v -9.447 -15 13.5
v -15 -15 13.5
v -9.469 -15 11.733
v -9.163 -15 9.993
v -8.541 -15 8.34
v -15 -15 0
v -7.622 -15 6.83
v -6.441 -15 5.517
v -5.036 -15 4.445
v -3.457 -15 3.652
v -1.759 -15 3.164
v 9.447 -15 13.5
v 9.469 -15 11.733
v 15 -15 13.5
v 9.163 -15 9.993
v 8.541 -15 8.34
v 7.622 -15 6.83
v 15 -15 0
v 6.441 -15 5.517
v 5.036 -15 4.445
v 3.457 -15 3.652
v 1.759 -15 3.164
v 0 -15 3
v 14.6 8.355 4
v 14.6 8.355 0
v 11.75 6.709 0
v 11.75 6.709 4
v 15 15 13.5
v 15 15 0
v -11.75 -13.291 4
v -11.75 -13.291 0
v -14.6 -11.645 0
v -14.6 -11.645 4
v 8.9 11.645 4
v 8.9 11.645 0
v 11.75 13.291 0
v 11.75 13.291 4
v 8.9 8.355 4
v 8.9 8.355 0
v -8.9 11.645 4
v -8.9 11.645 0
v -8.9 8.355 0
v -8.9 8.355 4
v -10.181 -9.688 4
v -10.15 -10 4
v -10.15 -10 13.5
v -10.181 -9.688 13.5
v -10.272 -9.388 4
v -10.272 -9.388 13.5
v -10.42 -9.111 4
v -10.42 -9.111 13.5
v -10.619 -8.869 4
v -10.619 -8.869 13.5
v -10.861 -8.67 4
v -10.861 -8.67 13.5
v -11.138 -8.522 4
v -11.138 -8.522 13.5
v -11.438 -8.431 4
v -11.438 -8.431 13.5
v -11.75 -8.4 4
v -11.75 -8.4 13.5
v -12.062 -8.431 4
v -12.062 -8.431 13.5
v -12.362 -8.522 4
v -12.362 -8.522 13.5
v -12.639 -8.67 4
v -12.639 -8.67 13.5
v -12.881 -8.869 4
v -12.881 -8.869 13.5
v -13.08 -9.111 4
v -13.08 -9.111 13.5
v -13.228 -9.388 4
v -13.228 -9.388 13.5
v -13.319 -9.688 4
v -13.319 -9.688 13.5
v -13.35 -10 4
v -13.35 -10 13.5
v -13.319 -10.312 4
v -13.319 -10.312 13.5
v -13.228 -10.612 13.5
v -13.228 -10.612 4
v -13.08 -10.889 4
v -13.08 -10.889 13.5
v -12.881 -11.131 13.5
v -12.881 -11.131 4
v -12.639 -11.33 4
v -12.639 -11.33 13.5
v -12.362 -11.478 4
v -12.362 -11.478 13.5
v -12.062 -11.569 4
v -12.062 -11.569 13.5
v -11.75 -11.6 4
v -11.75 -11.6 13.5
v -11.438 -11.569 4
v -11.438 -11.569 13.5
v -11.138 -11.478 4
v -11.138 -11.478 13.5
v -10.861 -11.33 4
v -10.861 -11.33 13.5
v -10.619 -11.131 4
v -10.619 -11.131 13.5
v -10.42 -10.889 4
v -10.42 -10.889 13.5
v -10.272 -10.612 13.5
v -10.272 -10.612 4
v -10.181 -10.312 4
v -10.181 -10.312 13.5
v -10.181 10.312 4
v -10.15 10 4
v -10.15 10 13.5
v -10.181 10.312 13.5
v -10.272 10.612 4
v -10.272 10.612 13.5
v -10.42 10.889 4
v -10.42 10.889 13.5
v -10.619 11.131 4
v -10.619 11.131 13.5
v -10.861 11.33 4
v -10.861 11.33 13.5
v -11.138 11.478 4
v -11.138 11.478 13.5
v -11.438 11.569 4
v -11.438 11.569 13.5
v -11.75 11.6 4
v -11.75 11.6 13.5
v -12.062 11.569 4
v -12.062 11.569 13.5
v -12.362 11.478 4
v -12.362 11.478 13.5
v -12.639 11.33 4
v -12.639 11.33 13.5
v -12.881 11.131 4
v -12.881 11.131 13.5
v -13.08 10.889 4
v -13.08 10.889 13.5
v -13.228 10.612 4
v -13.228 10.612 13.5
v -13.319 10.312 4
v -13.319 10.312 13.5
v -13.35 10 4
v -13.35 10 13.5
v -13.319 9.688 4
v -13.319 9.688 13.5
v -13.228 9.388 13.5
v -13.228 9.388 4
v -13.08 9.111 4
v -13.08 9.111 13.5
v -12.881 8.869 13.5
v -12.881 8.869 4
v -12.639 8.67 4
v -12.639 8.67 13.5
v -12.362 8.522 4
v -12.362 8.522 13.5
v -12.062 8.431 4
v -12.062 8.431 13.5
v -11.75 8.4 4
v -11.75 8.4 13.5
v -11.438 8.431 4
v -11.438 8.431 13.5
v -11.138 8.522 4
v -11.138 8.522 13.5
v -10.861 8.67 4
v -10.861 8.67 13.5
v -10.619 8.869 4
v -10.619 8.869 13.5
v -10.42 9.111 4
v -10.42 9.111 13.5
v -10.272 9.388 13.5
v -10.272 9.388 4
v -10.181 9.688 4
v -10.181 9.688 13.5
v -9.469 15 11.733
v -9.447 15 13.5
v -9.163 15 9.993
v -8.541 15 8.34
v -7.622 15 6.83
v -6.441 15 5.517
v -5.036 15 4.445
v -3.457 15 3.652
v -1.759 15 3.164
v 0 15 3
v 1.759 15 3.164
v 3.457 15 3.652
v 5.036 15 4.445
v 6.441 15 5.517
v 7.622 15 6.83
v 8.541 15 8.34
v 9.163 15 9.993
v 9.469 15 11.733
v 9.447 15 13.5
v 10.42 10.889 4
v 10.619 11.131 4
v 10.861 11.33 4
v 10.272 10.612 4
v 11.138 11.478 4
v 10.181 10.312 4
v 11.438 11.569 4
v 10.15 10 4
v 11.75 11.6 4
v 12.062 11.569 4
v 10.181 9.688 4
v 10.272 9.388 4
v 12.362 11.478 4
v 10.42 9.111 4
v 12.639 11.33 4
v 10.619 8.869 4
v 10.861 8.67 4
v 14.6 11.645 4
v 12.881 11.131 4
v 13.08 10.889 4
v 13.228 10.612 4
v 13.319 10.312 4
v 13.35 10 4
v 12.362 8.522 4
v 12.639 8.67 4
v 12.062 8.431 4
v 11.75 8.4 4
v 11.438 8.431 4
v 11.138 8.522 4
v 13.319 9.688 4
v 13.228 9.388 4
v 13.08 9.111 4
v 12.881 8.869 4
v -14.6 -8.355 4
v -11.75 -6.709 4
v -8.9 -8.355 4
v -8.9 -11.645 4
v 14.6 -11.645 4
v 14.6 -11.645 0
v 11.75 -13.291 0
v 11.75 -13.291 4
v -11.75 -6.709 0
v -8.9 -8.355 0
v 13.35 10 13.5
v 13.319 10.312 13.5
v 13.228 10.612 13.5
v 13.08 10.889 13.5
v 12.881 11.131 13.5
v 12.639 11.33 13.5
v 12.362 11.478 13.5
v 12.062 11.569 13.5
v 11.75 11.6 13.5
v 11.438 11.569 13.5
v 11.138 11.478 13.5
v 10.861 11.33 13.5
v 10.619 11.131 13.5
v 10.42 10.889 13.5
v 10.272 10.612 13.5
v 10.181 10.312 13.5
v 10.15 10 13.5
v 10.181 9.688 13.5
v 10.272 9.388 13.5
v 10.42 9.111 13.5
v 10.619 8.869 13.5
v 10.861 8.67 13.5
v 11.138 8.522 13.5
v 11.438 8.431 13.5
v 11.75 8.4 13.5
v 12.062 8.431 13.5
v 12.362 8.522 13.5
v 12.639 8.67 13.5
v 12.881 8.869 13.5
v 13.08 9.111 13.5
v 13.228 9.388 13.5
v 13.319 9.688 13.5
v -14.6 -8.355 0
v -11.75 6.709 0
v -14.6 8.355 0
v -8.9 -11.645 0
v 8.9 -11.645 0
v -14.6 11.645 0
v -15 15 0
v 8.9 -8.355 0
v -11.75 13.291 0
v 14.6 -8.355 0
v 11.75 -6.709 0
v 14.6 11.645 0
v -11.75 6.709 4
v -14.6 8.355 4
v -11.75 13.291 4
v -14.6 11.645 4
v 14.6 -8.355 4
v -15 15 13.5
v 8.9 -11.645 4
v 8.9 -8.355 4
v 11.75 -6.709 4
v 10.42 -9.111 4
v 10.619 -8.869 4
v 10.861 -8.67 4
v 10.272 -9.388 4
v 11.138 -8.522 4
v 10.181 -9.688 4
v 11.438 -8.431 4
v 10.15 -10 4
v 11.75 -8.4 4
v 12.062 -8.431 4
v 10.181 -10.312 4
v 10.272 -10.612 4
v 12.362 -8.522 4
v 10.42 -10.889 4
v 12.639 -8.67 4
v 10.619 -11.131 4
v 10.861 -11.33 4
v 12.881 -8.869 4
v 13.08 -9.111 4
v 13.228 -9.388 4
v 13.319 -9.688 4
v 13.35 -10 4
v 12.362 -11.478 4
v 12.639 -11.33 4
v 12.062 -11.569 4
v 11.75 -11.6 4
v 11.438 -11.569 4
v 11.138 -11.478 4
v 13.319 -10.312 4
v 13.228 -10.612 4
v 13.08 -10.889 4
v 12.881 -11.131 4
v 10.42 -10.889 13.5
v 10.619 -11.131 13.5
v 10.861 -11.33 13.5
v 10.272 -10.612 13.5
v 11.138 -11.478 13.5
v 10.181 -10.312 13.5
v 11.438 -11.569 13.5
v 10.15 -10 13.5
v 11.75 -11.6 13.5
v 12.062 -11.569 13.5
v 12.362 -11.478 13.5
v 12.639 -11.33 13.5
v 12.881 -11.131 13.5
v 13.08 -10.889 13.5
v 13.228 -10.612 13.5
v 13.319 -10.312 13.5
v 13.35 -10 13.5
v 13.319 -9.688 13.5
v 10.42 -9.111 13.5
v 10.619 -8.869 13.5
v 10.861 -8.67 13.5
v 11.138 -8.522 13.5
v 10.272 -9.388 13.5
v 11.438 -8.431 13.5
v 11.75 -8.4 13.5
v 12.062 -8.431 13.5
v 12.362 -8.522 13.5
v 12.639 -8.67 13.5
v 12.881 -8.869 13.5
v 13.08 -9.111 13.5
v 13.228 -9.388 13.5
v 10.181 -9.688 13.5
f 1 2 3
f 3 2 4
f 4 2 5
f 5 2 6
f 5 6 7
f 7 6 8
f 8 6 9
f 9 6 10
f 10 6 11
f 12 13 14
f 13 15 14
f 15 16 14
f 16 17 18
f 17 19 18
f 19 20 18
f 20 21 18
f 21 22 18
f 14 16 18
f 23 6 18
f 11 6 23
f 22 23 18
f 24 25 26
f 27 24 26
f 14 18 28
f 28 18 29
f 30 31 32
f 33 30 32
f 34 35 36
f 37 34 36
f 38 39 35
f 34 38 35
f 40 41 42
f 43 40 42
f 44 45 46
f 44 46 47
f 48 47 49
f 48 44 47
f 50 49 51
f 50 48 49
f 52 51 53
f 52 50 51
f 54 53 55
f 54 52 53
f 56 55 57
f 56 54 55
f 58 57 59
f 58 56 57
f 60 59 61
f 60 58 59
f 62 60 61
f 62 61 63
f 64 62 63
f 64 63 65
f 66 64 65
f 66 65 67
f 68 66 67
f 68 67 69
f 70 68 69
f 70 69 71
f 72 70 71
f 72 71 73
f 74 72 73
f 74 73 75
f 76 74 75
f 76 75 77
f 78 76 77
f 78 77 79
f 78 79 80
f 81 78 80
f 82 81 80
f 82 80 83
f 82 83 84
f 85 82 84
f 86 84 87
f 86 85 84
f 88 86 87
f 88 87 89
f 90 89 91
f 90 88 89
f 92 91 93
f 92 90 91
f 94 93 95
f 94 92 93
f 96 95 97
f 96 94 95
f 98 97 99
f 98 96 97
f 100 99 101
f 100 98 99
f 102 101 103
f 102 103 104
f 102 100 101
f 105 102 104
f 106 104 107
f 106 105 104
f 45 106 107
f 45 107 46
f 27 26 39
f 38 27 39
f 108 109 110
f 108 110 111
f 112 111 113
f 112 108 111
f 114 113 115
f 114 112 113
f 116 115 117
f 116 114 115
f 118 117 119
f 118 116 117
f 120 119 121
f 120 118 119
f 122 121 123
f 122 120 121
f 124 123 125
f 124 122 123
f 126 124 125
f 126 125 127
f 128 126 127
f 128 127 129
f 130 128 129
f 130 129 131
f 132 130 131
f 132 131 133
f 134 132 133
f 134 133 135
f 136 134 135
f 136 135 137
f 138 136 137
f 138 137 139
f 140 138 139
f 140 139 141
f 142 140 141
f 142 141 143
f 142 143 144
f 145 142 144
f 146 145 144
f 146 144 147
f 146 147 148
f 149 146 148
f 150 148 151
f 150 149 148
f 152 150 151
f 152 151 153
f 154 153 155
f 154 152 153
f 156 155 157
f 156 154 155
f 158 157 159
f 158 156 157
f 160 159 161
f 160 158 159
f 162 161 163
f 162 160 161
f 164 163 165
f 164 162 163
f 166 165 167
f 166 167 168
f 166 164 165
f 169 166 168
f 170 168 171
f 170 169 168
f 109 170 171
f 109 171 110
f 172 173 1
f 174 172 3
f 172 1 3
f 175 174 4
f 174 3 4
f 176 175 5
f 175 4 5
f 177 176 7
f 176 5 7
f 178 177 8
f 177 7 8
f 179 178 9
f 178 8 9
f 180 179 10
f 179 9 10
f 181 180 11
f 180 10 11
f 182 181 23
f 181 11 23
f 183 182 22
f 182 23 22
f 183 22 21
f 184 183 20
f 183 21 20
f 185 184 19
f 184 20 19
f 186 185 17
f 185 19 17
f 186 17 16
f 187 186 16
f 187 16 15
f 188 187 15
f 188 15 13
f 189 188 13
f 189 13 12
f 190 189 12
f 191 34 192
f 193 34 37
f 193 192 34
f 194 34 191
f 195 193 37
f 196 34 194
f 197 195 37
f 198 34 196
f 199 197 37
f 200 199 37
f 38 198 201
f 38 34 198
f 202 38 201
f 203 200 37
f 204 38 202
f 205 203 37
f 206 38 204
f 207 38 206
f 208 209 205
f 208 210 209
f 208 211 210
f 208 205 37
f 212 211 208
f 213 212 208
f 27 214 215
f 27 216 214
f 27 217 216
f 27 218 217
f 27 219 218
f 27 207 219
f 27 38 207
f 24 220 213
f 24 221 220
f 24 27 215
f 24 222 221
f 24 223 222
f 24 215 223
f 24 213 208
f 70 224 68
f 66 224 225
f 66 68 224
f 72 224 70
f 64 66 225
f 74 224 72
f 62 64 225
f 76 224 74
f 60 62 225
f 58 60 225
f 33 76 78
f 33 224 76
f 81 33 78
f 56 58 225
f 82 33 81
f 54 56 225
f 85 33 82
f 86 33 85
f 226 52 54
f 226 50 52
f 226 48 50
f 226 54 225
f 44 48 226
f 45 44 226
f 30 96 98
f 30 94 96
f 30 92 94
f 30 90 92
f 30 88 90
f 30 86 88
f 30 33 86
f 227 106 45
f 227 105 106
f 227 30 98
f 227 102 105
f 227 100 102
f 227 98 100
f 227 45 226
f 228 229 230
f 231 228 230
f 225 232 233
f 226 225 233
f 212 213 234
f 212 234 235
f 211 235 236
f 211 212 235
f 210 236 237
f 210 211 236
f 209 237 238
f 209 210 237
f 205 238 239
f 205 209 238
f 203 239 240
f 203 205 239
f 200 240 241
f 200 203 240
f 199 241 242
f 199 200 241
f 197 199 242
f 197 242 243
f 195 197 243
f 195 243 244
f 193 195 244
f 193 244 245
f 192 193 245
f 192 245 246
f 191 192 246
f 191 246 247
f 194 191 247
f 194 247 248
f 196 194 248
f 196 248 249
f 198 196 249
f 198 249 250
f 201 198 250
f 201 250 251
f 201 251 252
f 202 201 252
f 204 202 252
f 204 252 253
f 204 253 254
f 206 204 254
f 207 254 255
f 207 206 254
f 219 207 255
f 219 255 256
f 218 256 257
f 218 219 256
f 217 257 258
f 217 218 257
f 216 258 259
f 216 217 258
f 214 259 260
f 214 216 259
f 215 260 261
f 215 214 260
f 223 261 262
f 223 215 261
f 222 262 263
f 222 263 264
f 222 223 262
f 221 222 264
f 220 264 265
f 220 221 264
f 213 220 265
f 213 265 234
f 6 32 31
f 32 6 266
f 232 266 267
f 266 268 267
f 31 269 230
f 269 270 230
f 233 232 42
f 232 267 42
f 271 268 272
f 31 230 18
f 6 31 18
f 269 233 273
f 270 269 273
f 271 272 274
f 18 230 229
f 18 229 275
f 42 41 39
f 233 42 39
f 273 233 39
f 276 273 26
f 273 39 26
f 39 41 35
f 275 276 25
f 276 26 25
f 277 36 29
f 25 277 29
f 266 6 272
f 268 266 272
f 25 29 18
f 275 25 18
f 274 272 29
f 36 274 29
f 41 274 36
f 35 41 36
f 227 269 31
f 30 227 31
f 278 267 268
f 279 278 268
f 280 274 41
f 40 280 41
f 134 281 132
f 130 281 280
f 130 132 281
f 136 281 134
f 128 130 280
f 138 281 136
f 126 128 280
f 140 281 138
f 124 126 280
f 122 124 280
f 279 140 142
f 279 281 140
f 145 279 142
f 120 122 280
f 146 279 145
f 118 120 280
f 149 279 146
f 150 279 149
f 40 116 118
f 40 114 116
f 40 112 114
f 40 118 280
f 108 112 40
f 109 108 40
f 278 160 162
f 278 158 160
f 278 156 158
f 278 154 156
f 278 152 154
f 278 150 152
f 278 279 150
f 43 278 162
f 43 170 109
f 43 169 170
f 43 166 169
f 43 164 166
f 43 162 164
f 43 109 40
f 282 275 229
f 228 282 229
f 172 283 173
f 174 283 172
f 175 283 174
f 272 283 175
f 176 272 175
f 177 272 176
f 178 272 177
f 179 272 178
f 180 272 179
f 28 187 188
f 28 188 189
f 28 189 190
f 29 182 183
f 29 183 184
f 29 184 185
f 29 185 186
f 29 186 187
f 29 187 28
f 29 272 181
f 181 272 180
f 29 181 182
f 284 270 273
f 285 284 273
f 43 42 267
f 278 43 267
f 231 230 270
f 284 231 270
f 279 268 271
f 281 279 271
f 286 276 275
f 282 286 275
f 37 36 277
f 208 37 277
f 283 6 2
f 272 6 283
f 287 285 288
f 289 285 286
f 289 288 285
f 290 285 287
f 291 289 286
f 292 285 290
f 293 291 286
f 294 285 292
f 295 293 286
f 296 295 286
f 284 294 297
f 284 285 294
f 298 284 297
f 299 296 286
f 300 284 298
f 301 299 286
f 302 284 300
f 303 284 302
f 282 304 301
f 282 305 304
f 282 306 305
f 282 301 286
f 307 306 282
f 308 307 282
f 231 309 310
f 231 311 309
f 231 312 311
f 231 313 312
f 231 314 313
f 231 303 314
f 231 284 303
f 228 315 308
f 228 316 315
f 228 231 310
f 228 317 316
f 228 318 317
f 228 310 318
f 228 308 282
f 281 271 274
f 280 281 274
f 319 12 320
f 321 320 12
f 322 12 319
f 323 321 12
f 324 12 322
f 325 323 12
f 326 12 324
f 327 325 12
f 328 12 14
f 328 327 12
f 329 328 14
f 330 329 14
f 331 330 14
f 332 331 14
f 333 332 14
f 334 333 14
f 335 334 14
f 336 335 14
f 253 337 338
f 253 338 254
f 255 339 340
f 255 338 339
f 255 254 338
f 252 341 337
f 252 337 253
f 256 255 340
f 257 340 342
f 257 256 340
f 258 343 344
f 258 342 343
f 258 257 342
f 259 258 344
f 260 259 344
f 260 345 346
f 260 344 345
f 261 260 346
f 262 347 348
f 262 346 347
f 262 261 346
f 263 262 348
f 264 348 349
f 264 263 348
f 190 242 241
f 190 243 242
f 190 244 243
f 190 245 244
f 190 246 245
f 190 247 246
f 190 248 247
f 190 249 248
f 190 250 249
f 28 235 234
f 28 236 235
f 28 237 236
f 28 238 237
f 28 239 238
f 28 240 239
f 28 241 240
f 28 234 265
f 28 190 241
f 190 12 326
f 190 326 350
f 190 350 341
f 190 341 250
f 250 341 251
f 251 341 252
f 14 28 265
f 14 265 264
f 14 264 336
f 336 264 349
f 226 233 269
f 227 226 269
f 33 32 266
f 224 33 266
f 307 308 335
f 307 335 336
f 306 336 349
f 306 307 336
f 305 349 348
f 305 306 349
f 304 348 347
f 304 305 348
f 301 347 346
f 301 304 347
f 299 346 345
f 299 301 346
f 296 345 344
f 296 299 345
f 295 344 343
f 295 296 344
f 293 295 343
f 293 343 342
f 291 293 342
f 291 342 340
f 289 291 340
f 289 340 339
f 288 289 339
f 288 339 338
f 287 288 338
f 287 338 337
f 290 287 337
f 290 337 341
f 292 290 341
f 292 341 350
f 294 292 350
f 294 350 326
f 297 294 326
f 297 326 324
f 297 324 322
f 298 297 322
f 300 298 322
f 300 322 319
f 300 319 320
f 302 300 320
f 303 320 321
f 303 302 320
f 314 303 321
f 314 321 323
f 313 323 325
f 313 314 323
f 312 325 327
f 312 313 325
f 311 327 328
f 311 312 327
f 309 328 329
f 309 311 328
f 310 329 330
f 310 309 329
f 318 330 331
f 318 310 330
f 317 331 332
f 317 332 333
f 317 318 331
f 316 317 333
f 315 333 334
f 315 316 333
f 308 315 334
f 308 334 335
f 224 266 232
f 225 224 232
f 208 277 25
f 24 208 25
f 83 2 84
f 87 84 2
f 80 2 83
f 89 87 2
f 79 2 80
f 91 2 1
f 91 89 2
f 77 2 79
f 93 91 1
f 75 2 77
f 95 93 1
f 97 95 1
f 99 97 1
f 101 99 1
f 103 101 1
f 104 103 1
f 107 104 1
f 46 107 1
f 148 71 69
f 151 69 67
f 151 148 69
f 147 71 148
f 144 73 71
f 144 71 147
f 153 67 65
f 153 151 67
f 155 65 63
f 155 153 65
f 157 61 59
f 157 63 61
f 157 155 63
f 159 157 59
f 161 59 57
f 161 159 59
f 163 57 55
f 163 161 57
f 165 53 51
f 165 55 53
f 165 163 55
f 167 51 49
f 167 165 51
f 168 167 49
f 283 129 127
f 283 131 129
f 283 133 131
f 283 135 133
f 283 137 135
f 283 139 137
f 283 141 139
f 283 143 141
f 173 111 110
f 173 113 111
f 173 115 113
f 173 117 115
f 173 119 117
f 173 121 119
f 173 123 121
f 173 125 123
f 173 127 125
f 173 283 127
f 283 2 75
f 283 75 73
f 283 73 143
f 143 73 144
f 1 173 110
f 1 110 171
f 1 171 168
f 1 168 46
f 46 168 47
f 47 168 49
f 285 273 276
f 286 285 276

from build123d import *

# Parameters (mm, degrees)
F0_W     = 30
F0_H     = 30
F0_R     = 1.6
F1_DEPTH = 13.5
F2_R     = 9.5
F3_DEPTH = 30.001
F5_DEPTH = 4


with BuildPart() as f1:
    # F0 (on Top) → F1 (new body)
    with BuildSketch(Plane.XY):
        Rectangle(F0_W, F0_H)
        with Locations((-11.75, -10)):
            Circle(F0_R, mode=Mode.SUBTRACT)
        with Locations((11.75, -10)):
            Circle(F0_R, mode=Mode.SUBTRACT)
        with Locations((-11.75, 10)):
            Circle(F0_R, mode=Mode.SUBTRACT)
        with Locations((11.75, 10)):
            Circle(F0_R, mode=Mode.SUBTRACT)
    extrude(amount=F1_DEPTH)

    # F2 (on face) → F3 (cut, through all)
    with BuildSketch(Plane.XZ.offset(15)):
        with Locations((0, 12.5)):
            Circle(F2_R)
    extrude(amount=-F3_DEPTH, mode=Mode.SUBTRACT)

    # F4 (on face) → F5 (cut)
    with BuildSketch(Plane(origin=(0, 0, 0), x_dir=(1, 0, 0), z_dir=(0, 0, -1))):
        Polygon((-8.9, 8.354552), (-8.9, 11.645448), (-11.75, 13.290897), (-14.6, 11.645448), (-14.6, 8.354552), (-11.75, 6.709103), align=None)
        Polygon((14.6, 11.645448), (11.75, 13.290897), (8.9, 11.645448), (8.9, 8.354552), (11.75, 6.709103), (14.6, 8.354552), align=None)
        Polygon((14.6, -11.645448), (14.6, -8.354552), (11.75, -6.709103), (8.9, -8.354552), (8.9, -11.645448), (11.75, -13.290897), align=None)
        Polygon((-11.75, -13.290897), (-8.9, -11.645448), (-8.9, -8.354552), (-11.75, -6.709103), (-14.6, -8.354552), (-14.6, -11.645448), align=None)
    extrude(amount=-F5_DEPTH, mode=Mode.SUBTRACT)


solid = f1.part
